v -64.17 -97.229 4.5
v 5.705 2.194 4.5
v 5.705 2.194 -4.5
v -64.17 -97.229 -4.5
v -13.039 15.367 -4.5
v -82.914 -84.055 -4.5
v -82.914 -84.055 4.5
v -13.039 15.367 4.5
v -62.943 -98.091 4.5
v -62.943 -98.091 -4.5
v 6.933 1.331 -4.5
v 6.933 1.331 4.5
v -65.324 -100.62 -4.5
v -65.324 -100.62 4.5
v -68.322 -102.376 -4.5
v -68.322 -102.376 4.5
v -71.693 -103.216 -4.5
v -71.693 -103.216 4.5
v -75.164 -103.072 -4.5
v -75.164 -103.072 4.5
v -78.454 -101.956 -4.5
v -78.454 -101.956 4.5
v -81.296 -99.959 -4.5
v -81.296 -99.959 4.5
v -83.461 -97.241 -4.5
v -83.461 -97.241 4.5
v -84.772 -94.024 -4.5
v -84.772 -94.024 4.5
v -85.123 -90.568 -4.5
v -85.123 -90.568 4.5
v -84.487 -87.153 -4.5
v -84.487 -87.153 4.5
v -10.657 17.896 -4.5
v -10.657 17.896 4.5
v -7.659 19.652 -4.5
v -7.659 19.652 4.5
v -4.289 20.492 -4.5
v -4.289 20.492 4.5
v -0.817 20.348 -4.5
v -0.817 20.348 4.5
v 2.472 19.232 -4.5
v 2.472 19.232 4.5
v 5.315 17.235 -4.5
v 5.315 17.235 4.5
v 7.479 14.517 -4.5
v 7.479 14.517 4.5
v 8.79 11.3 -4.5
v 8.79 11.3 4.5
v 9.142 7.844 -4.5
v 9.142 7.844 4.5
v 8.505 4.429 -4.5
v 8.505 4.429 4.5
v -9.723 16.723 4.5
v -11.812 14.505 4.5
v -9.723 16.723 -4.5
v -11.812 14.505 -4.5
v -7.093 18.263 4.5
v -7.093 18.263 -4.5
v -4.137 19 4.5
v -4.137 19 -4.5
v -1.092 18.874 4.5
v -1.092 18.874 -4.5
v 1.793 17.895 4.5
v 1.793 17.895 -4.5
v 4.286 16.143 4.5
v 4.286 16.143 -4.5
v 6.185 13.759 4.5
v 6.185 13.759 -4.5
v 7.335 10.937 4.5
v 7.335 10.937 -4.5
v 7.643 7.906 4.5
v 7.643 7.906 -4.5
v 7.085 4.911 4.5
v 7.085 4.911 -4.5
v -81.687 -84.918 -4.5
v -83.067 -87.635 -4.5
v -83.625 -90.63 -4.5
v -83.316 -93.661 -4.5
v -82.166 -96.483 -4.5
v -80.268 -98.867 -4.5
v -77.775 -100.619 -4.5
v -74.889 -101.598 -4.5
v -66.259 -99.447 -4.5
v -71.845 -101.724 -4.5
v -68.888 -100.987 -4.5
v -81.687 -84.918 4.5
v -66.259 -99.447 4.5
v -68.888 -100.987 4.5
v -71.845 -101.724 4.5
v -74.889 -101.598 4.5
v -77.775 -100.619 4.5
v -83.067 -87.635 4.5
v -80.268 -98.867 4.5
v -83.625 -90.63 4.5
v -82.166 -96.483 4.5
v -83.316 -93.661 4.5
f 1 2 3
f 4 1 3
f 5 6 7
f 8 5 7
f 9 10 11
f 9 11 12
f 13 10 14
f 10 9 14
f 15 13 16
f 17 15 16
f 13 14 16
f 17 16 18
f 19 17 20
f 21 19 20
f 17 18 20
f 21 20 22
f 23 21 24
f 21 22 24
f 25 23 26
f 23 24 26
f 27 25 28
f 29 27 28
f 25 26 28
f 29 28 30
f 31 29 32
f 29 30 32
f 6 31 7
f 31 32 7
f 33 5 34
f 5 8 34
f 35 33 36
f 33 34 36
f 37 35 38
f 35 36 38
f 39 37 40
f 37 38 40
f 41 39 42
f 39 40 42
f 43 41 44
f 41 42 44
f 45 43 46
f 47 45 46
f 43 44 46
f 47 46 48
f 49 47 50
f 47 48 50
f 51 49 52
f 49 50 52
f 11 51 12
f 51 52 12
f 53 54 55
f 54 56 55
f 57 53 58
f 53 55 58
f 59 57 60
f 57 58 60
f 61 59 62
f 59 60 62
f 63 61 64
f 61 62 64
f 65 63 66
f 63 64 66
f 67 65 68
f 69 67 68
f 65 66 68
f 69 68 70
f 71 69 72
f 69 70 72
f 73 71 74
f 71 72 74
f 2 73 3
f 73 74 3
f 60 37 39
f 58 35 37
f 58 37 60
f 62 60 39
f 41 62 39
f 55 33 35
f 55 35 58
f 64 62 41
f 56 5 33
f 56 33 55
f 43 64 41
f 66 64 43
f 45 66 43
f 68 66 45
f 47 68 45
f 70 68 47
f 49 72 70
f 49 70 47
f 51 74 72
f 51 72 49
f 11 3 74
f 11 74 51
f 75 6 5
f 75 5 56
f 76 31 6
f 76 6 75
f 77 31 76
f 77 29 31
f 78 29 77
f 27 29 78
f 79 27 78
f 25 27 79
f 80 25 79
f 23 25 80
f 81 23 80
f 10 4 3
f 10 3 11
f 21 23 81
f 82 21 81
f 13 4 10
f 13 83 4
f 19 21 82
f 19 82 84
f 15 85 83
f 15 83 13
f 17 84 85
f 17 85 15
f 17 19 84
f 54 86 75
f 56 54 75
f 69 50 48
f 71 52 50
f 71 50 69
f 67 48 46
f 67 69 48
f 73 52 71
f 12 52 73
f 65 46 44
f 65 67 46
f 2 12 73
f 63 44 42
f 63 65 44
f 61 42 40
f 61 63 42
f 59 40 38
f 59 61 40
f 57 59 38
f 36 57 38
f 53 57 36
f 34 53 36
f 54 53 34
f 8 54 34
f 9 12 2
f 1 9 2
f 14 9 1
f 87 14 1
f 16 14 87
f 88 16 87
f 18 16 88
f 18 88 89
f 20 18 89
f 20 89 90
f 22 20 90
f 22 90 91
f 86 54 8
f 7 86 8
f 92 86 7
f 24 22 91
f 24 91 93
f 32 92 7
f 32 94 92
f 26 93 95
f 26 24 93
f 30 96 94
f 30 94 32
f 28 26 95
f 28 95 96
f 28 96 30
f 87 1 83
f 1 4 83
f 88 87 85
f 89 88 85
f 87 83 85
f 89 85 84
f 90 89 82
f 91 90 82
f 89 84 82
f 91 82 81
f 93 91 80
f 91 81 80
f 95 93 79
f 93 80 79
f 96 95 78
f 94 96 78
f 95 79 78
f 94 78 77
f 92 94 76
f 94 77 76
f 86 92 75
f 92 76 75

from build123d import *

# Parameters (mm, degrees)
SKETCH2_W = 1.5
SKETCH2_H = 9


with BuildPart() as part:
    # Sweep1: sweep along a path in Sketch1
    with BuildLine(Plane.XY) as sweep1_path:
        Line((6.319054119, 1.762345914), (-63.556322052, -97.660180283))
        ThreePointArc((-63.556322052, -97.660180283), (-79.51547051, -100.445491543), (-82.30078177, -84.486343085))
        Line((-82.30078177, -84.486343085), (-12.425405599, 14.936183112))
        ThreePointArc((-12.425405599, 14.936183112), (3.533742859, 17.721494372), (6.319054119, 1.762345914))
    # Sketch2 → Sweep1 (sweep)
    with BuildSketch(Plane(origin=(-12.425405599, 14.936183112, 0), x_dir=(0.818149507, -0.575005552, 0), z_dir=(0.575005552, 0.818149507, 0))):
        Rectangle(SKETCH2_W, SKETCH2_H)
    sweep(path=sweep1_path.line)


solid = part.part
